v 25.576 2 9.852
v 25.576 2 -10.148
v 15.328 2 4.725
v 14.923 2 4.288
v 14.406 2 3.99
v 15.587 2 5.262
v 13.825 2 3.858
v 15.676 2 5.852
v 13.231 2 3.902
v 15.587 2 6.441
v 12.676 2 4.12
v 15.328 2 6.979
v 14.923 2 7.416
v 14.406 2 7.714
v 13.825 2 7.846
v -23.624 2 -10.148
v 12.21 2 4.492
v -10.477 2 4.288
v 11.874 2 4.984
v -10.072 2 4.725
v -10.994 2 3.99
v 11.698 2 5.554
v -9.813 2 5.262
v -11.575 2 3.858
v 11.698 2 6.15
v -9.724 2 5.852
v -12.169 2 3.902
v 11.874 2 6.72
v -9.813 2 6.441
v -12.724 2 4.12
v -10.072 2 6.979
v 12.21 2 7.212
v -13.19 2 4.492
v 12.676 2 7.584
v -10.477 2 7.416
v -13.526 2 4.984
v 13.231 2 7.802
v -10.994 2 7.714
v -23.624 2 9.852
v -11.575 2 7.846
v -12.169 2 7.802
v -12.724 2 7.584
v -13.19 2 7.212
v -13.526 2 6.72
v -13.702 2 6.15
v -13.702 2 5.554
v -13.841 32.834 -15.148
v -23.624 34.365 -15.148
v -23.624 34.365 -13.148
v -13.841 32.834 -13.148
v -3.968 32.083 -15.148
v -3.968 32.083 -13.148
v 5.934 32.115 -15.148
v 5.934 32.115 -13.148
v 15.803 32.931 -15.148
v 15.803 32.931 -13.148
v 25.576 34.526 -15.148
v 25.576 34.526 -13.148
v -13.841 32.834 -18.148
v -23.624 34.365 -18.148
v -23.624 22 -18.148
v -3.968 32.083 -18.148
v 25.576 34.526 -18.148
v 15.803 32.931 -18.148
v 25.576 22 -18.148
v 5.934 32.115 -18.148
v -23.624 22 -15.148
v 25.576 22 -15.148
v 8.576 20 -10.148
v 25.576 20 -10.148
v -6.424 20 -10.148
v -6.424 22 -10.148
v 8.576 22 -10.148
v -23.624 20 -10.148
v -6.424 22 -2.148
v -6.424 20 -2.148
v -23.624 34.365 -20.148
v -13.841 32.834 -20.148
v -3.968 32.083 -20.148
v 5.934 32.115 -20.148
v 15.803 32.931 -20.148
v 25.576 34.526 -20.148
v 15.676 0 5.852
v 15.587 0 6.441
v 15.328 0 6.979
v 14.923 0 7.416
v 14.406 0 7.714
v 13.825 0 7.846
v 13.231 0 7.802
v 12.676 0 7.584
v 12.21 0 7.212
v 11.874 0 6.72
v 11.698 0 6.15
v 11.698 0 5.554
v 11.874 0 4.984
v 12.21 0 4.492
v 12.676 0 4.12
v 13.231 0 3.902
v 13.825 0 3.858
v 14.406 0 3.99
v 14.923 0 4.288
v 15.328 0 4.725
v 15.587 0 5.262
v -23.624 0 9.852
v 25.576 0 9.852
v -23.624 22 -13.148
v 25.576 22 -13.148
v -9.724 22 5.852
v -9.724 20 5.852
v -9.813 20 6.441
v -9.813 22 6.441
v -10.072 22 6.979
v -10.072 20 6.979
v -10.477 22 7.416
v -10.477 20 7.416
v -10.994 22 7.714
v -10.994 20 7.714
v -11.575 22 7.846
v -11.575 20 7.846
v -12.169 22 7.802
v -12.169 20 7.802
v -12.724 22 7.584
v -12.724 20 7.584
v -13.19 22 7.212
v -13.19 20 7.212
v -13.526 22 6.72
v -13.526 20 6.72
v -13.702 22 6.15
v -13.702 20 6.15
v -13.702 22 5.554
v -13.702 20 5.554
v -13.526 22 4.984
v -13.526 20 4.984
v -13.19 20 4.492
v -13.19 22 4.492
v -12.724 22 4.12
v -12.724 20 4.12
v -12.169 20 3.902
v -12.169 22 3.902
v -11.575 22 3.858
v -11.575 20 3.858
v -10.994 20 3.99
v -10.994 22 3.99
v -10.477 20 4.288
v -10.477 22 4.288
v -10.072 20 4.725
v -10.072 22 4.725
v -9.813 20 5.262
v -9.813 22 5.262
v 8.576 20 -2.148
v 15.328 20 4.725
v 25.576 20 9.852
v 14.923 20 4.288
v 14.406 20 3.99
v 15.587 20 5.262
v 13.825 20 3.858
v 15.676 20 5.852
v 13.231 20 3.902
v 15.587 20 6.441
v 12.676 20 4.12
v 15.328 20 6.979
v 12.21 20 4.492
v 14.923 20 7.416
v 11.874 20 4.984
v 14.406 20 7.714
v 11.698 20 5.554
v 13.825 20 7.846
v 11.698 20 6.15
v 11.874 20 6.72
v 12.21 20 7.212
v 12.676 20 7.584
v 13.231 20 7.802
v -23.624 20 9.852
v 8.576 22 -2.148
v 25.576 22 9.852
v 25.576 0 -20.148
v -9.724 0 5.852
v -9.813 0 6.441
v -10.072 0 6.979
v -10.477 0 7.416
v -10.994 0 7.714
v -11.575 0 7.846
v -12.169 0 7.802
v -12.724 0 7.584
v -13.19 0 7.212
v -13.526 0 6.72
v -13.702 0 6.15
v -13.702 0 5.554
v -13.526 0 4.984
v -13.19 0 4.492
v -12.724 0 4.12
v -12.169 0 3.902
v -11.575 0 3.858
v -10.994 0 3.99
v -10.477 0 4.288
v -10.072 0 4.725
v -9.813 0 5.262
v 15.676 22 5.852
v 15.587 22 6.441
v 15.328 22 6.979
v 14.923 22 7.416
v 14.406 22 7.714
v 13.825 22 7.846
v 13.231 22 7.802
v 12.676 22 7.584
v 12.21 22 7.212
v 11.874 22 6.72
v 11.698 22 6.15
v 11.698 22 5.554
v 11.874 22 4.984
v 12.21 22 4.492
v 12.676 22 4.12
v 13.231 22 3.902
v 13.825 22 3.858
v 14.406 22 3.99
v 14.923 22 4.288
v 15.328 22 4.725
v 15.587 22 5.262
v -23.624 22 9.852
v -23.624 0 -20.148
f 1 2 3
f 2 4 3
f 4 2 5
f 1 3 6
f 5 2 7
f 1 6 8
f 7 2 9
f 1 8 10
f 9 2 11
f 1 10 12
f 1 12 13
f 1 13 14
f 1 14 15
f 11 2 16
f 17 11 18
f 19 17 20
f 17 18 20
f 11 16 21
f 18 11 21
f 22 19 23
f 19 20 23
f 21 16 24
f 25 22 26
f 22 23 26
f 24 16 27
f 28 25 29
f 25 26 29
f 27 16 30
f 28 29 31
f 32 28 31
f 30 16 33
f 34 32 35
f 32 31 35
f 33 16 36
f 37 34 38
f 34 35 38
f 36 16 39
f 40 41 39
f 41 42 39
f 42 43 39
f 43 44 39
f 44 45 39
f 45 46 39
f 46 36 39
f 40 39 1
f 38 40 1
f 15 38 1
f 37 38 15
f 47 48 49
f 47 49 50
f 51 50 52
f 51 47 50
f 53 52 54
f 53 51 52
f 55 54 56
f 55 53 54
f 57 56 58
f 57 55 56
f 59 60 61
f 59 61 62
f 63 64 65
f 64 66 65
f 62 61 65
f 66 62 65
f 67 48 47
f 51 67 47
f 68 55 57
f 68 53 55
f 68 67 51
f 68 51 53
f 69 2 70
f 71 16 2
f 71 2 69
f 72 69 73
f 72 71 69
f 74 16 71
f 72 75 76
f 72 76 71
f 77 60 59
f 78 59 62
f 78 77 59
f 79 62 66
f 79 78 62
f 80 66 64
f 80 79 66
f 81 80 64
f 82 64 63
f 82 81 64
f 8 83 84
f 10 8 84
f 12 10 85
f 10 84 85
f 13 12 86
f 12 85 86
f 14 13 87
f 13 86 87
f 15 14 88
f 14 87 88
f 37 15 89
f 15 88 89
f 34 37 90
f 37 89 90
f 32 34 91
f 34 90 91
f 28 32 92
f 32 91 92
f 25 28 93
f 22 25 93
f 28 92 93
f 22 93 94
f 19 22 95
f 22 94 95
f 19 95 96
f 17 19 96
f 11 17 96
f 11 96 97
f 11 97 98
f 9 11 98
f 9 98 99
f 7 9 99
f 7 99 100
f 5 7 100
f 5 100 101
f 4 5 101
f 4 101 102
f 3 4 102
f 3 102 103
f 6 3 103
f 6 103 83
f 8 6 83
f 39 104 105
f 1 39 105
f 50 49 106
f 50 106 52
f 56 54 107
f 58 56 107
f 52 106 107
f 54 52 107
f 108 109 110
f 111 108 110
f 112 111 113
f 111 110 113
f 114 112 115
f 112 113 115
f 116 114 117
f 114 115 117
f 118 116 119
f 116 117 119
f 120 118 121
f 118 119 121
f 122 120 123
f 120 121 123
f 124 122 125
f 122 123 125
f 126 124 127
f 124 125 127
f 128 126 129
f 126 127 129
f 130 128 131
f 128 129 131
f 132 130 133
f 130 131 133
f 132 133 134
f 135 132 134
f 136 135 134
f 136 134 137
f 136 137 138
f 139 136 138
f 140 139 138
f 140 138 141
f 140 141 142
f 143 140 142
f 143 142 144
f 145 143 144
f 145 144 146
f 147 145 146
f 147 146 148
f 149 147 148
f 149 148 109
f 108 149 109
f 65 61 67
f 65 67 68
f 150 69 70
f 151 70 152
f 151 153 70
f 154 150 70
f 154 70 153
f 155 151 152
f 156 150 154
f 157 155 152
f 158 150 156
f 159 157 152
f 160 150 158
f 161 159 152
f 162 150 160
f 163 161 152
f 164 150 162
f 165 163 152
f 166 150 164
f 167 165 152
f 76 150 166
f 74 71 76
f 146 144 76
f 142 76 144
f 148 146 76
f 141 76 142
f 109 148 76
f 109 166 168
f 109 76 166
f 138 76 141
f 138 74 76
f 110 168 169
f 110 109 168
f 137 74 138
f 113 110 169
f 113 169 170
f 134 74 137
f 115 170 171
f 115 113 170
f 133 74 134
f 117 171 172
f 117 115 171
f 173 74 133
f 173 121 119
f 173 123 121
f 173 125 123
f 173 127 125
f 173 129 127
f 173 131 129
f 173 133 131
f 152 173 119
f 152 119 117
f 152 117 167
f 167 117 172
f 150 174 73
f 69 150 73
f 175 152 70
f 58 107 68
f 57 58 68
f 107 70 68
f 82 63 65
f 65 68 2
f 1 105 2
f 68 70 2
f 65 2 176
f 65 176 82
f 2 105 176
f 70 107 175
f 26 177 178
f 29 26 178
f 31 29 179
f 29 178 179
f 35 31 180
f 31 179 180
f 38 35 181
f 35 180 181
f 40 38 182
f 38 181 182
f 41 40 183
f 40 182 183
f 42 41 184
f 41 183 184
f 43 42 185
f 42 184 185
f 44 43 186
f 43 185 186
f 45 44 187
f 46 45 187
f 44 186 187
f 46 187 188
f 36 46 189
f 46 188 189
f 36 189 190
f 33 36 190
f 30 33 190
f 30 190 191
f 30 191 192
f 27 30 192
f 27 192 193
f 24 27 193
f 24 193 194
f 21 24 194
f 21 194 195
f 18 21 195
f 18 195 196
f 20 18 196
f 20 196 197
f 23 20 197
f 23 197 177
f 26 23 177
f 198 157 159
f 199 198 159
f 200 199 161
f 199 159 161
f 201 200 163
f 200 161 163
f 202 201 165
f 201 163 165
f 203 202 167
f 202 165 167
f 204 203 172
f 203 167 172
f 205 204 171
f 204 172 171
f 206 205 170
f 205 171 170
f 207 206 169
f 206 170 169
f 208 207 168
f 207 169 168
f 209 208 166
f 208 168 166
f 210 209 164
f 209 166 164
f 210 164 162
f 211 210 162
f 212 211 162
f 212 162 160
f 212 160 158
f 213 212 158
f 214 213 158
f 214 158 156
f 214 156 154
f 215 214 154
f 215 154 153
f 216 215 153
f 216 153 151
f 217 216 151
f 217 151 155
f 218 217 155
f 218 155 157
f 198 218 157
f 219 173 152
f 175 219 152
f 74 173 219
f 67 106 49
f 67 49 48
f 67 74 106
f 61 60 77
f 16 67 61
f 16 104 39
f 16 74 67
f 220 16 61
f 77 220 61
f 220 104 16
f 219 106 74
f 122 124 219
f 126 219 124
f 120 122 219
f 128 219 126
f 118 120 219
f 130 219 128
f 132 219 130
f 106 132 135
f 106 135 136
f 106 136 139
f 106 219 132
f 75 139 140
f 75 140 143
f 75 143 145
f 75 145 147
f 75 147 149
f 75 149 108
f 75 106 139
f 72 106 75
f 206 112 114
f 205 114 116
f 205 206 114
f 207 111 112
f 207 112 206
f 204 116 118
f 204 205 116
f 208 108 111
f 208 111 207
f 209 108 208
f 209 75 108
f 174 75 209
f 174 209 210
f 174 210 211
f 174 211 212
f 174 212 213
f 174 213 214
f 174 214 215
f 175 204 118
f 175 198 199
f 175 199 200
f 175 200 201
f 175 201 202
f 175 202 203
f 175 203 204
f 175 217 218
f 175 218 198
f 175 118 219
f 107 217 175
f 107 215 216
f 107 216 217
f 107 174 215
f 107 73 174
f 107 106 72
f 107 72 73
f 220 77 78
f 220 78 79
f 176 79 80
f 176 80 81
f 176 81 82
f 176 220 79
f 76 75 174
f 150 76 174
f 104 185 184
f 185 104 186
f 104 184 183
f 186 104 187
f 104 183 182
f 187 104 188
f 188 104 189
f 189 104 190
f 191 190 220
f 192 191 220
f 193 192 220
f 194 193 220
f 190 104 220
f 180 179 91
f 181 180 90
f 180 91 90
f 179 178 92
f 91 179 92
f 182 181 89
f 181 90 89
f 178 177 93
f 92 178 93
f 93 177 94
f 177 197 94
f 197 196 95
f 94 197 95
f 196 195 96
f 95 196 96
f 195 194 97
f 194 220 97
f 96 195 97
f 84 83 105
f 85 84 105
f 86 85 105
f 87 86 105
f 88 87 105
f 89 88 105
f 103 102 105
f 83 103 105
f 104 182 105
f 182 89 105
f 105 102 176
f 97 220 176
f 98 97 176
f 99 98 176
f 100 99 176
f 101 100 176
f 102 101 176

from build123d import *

# Parameters (mm, degrees)
SKETCH_1_W          = 49.2
SKETCH_1_H          = 30
EXTRUDE_1_DEPTH     = 22
SKETCH_2_W          = 49.2
SKETCH_2_H          = 2
EXTRUDE_2_DEPTH     = 20
CUT_EXTRUDE_1_DEPTH = 7
SKETCH_4_W          = 20
SKETCH_4_H          = 18
CUT_EXTRUDE_2_DEPTH = 50
SKETCH_5_R          = 2
CUT_EXTRUDE_3_DEPTH = 22
SKETCH_7_W          = 15
SKETCH_7_H          = 8
CUT_EXTRUDE_4_DEPTH = 2


with BuildPart() as part:
    # 스케치1 → 보스-돌출1 (new body)
    with BuildSketch(Plane(origin=(0, 0, 0), x_dir=(1, 0, 0), z_dir=(0, 1, 0))):
        with Locations((0.975657895, 5.148026316)):
            Rectangle(SKETCH_1_W, SKETCH_1_H)
    extrude(amount=EXTRUDE_1_DEPTH)

    # 스케치2 → 보스-돌출2 (add)
    with BuildSketch(Plane(origin=(0, 22, 0), x_dir=(1, 0, 0), z_dir=(0, 1, 0))):
        with Locations((0.975657895, 19.148026316)):
            Rectangle(SKETCH_2_W, SKETCH_2_H)
        with Locations((0.975657895, 14.148026316)):
            Rectangle(SKETCH_2_W, SKETCH_2_H)
    extrude(amount=EXTRUDE_2_DEPTH)

    # 스케치3 → 컷-돌출1 (cut)
    with BuildSketch(Plane(origin=(0, 0, -20.148026316), x_dir=(-1, 0, 0), z_dir=(0, 0, -1))):
        with BuildLine():
            Line((-25.575657895, 42), (23.624342105, 42))
            Line((23.624342105, 42), (23.624342105, 34.364931606))
            ThreePointArc((23.624342105, 34.364931606), (-0.983636552, 32.000665788), (-25.575657895, 34.525512861))
            Line((-25.575657895, 34.525512861), (-25.575657895, 42))
        make_face()
    extrude(amount=-CUT_EXTRUDE_1_DEPTH, mode=Mode.SUBTRACT)

    # 스케치4 → 컷-돌출2 (cut)
    with BuildSketch(Plane.ZY.offset(23.624342105)):
        with Locations((-0.148026316, 11)):
            Rectangle(SKETCH_4_W, SKETCH_4_H)
    extrude(amount=-CUT_EXTRUDE_2_DEPTH, mode=Mode.SUBTRACT)

    # 스케치5 → 컷-돌출3 (cut)
    with BuildSketch(Plane.XZ):
        with Locations((13.675657895, 5.851973684)):
            Circle(SKETCH_5_R)
        with Locations((-11.724342105, 5.851973684)):
            Circle(SKETCH_5_R)
    extrude(amount=-CUT_EXTRUDE_3_DEPTH, mode=Mode.SUBTRACT)

    # 스케치7 → 컷-돌출4 (cut)
    with BuildSketch(Plane(origin=(0, 22, 0), x_dir=(1, 0, 0), z_dir=(0, 1, 0))):
        with Locations((1.075657895, 6.148026316)):
            Rectangle(SKETCH_7_W, SKETCH_7_H)
    extrude(amount=-CUT_EXTRUDE_4_DEPTH, mode=Mode.SUBTRACT)


solid = part.part
